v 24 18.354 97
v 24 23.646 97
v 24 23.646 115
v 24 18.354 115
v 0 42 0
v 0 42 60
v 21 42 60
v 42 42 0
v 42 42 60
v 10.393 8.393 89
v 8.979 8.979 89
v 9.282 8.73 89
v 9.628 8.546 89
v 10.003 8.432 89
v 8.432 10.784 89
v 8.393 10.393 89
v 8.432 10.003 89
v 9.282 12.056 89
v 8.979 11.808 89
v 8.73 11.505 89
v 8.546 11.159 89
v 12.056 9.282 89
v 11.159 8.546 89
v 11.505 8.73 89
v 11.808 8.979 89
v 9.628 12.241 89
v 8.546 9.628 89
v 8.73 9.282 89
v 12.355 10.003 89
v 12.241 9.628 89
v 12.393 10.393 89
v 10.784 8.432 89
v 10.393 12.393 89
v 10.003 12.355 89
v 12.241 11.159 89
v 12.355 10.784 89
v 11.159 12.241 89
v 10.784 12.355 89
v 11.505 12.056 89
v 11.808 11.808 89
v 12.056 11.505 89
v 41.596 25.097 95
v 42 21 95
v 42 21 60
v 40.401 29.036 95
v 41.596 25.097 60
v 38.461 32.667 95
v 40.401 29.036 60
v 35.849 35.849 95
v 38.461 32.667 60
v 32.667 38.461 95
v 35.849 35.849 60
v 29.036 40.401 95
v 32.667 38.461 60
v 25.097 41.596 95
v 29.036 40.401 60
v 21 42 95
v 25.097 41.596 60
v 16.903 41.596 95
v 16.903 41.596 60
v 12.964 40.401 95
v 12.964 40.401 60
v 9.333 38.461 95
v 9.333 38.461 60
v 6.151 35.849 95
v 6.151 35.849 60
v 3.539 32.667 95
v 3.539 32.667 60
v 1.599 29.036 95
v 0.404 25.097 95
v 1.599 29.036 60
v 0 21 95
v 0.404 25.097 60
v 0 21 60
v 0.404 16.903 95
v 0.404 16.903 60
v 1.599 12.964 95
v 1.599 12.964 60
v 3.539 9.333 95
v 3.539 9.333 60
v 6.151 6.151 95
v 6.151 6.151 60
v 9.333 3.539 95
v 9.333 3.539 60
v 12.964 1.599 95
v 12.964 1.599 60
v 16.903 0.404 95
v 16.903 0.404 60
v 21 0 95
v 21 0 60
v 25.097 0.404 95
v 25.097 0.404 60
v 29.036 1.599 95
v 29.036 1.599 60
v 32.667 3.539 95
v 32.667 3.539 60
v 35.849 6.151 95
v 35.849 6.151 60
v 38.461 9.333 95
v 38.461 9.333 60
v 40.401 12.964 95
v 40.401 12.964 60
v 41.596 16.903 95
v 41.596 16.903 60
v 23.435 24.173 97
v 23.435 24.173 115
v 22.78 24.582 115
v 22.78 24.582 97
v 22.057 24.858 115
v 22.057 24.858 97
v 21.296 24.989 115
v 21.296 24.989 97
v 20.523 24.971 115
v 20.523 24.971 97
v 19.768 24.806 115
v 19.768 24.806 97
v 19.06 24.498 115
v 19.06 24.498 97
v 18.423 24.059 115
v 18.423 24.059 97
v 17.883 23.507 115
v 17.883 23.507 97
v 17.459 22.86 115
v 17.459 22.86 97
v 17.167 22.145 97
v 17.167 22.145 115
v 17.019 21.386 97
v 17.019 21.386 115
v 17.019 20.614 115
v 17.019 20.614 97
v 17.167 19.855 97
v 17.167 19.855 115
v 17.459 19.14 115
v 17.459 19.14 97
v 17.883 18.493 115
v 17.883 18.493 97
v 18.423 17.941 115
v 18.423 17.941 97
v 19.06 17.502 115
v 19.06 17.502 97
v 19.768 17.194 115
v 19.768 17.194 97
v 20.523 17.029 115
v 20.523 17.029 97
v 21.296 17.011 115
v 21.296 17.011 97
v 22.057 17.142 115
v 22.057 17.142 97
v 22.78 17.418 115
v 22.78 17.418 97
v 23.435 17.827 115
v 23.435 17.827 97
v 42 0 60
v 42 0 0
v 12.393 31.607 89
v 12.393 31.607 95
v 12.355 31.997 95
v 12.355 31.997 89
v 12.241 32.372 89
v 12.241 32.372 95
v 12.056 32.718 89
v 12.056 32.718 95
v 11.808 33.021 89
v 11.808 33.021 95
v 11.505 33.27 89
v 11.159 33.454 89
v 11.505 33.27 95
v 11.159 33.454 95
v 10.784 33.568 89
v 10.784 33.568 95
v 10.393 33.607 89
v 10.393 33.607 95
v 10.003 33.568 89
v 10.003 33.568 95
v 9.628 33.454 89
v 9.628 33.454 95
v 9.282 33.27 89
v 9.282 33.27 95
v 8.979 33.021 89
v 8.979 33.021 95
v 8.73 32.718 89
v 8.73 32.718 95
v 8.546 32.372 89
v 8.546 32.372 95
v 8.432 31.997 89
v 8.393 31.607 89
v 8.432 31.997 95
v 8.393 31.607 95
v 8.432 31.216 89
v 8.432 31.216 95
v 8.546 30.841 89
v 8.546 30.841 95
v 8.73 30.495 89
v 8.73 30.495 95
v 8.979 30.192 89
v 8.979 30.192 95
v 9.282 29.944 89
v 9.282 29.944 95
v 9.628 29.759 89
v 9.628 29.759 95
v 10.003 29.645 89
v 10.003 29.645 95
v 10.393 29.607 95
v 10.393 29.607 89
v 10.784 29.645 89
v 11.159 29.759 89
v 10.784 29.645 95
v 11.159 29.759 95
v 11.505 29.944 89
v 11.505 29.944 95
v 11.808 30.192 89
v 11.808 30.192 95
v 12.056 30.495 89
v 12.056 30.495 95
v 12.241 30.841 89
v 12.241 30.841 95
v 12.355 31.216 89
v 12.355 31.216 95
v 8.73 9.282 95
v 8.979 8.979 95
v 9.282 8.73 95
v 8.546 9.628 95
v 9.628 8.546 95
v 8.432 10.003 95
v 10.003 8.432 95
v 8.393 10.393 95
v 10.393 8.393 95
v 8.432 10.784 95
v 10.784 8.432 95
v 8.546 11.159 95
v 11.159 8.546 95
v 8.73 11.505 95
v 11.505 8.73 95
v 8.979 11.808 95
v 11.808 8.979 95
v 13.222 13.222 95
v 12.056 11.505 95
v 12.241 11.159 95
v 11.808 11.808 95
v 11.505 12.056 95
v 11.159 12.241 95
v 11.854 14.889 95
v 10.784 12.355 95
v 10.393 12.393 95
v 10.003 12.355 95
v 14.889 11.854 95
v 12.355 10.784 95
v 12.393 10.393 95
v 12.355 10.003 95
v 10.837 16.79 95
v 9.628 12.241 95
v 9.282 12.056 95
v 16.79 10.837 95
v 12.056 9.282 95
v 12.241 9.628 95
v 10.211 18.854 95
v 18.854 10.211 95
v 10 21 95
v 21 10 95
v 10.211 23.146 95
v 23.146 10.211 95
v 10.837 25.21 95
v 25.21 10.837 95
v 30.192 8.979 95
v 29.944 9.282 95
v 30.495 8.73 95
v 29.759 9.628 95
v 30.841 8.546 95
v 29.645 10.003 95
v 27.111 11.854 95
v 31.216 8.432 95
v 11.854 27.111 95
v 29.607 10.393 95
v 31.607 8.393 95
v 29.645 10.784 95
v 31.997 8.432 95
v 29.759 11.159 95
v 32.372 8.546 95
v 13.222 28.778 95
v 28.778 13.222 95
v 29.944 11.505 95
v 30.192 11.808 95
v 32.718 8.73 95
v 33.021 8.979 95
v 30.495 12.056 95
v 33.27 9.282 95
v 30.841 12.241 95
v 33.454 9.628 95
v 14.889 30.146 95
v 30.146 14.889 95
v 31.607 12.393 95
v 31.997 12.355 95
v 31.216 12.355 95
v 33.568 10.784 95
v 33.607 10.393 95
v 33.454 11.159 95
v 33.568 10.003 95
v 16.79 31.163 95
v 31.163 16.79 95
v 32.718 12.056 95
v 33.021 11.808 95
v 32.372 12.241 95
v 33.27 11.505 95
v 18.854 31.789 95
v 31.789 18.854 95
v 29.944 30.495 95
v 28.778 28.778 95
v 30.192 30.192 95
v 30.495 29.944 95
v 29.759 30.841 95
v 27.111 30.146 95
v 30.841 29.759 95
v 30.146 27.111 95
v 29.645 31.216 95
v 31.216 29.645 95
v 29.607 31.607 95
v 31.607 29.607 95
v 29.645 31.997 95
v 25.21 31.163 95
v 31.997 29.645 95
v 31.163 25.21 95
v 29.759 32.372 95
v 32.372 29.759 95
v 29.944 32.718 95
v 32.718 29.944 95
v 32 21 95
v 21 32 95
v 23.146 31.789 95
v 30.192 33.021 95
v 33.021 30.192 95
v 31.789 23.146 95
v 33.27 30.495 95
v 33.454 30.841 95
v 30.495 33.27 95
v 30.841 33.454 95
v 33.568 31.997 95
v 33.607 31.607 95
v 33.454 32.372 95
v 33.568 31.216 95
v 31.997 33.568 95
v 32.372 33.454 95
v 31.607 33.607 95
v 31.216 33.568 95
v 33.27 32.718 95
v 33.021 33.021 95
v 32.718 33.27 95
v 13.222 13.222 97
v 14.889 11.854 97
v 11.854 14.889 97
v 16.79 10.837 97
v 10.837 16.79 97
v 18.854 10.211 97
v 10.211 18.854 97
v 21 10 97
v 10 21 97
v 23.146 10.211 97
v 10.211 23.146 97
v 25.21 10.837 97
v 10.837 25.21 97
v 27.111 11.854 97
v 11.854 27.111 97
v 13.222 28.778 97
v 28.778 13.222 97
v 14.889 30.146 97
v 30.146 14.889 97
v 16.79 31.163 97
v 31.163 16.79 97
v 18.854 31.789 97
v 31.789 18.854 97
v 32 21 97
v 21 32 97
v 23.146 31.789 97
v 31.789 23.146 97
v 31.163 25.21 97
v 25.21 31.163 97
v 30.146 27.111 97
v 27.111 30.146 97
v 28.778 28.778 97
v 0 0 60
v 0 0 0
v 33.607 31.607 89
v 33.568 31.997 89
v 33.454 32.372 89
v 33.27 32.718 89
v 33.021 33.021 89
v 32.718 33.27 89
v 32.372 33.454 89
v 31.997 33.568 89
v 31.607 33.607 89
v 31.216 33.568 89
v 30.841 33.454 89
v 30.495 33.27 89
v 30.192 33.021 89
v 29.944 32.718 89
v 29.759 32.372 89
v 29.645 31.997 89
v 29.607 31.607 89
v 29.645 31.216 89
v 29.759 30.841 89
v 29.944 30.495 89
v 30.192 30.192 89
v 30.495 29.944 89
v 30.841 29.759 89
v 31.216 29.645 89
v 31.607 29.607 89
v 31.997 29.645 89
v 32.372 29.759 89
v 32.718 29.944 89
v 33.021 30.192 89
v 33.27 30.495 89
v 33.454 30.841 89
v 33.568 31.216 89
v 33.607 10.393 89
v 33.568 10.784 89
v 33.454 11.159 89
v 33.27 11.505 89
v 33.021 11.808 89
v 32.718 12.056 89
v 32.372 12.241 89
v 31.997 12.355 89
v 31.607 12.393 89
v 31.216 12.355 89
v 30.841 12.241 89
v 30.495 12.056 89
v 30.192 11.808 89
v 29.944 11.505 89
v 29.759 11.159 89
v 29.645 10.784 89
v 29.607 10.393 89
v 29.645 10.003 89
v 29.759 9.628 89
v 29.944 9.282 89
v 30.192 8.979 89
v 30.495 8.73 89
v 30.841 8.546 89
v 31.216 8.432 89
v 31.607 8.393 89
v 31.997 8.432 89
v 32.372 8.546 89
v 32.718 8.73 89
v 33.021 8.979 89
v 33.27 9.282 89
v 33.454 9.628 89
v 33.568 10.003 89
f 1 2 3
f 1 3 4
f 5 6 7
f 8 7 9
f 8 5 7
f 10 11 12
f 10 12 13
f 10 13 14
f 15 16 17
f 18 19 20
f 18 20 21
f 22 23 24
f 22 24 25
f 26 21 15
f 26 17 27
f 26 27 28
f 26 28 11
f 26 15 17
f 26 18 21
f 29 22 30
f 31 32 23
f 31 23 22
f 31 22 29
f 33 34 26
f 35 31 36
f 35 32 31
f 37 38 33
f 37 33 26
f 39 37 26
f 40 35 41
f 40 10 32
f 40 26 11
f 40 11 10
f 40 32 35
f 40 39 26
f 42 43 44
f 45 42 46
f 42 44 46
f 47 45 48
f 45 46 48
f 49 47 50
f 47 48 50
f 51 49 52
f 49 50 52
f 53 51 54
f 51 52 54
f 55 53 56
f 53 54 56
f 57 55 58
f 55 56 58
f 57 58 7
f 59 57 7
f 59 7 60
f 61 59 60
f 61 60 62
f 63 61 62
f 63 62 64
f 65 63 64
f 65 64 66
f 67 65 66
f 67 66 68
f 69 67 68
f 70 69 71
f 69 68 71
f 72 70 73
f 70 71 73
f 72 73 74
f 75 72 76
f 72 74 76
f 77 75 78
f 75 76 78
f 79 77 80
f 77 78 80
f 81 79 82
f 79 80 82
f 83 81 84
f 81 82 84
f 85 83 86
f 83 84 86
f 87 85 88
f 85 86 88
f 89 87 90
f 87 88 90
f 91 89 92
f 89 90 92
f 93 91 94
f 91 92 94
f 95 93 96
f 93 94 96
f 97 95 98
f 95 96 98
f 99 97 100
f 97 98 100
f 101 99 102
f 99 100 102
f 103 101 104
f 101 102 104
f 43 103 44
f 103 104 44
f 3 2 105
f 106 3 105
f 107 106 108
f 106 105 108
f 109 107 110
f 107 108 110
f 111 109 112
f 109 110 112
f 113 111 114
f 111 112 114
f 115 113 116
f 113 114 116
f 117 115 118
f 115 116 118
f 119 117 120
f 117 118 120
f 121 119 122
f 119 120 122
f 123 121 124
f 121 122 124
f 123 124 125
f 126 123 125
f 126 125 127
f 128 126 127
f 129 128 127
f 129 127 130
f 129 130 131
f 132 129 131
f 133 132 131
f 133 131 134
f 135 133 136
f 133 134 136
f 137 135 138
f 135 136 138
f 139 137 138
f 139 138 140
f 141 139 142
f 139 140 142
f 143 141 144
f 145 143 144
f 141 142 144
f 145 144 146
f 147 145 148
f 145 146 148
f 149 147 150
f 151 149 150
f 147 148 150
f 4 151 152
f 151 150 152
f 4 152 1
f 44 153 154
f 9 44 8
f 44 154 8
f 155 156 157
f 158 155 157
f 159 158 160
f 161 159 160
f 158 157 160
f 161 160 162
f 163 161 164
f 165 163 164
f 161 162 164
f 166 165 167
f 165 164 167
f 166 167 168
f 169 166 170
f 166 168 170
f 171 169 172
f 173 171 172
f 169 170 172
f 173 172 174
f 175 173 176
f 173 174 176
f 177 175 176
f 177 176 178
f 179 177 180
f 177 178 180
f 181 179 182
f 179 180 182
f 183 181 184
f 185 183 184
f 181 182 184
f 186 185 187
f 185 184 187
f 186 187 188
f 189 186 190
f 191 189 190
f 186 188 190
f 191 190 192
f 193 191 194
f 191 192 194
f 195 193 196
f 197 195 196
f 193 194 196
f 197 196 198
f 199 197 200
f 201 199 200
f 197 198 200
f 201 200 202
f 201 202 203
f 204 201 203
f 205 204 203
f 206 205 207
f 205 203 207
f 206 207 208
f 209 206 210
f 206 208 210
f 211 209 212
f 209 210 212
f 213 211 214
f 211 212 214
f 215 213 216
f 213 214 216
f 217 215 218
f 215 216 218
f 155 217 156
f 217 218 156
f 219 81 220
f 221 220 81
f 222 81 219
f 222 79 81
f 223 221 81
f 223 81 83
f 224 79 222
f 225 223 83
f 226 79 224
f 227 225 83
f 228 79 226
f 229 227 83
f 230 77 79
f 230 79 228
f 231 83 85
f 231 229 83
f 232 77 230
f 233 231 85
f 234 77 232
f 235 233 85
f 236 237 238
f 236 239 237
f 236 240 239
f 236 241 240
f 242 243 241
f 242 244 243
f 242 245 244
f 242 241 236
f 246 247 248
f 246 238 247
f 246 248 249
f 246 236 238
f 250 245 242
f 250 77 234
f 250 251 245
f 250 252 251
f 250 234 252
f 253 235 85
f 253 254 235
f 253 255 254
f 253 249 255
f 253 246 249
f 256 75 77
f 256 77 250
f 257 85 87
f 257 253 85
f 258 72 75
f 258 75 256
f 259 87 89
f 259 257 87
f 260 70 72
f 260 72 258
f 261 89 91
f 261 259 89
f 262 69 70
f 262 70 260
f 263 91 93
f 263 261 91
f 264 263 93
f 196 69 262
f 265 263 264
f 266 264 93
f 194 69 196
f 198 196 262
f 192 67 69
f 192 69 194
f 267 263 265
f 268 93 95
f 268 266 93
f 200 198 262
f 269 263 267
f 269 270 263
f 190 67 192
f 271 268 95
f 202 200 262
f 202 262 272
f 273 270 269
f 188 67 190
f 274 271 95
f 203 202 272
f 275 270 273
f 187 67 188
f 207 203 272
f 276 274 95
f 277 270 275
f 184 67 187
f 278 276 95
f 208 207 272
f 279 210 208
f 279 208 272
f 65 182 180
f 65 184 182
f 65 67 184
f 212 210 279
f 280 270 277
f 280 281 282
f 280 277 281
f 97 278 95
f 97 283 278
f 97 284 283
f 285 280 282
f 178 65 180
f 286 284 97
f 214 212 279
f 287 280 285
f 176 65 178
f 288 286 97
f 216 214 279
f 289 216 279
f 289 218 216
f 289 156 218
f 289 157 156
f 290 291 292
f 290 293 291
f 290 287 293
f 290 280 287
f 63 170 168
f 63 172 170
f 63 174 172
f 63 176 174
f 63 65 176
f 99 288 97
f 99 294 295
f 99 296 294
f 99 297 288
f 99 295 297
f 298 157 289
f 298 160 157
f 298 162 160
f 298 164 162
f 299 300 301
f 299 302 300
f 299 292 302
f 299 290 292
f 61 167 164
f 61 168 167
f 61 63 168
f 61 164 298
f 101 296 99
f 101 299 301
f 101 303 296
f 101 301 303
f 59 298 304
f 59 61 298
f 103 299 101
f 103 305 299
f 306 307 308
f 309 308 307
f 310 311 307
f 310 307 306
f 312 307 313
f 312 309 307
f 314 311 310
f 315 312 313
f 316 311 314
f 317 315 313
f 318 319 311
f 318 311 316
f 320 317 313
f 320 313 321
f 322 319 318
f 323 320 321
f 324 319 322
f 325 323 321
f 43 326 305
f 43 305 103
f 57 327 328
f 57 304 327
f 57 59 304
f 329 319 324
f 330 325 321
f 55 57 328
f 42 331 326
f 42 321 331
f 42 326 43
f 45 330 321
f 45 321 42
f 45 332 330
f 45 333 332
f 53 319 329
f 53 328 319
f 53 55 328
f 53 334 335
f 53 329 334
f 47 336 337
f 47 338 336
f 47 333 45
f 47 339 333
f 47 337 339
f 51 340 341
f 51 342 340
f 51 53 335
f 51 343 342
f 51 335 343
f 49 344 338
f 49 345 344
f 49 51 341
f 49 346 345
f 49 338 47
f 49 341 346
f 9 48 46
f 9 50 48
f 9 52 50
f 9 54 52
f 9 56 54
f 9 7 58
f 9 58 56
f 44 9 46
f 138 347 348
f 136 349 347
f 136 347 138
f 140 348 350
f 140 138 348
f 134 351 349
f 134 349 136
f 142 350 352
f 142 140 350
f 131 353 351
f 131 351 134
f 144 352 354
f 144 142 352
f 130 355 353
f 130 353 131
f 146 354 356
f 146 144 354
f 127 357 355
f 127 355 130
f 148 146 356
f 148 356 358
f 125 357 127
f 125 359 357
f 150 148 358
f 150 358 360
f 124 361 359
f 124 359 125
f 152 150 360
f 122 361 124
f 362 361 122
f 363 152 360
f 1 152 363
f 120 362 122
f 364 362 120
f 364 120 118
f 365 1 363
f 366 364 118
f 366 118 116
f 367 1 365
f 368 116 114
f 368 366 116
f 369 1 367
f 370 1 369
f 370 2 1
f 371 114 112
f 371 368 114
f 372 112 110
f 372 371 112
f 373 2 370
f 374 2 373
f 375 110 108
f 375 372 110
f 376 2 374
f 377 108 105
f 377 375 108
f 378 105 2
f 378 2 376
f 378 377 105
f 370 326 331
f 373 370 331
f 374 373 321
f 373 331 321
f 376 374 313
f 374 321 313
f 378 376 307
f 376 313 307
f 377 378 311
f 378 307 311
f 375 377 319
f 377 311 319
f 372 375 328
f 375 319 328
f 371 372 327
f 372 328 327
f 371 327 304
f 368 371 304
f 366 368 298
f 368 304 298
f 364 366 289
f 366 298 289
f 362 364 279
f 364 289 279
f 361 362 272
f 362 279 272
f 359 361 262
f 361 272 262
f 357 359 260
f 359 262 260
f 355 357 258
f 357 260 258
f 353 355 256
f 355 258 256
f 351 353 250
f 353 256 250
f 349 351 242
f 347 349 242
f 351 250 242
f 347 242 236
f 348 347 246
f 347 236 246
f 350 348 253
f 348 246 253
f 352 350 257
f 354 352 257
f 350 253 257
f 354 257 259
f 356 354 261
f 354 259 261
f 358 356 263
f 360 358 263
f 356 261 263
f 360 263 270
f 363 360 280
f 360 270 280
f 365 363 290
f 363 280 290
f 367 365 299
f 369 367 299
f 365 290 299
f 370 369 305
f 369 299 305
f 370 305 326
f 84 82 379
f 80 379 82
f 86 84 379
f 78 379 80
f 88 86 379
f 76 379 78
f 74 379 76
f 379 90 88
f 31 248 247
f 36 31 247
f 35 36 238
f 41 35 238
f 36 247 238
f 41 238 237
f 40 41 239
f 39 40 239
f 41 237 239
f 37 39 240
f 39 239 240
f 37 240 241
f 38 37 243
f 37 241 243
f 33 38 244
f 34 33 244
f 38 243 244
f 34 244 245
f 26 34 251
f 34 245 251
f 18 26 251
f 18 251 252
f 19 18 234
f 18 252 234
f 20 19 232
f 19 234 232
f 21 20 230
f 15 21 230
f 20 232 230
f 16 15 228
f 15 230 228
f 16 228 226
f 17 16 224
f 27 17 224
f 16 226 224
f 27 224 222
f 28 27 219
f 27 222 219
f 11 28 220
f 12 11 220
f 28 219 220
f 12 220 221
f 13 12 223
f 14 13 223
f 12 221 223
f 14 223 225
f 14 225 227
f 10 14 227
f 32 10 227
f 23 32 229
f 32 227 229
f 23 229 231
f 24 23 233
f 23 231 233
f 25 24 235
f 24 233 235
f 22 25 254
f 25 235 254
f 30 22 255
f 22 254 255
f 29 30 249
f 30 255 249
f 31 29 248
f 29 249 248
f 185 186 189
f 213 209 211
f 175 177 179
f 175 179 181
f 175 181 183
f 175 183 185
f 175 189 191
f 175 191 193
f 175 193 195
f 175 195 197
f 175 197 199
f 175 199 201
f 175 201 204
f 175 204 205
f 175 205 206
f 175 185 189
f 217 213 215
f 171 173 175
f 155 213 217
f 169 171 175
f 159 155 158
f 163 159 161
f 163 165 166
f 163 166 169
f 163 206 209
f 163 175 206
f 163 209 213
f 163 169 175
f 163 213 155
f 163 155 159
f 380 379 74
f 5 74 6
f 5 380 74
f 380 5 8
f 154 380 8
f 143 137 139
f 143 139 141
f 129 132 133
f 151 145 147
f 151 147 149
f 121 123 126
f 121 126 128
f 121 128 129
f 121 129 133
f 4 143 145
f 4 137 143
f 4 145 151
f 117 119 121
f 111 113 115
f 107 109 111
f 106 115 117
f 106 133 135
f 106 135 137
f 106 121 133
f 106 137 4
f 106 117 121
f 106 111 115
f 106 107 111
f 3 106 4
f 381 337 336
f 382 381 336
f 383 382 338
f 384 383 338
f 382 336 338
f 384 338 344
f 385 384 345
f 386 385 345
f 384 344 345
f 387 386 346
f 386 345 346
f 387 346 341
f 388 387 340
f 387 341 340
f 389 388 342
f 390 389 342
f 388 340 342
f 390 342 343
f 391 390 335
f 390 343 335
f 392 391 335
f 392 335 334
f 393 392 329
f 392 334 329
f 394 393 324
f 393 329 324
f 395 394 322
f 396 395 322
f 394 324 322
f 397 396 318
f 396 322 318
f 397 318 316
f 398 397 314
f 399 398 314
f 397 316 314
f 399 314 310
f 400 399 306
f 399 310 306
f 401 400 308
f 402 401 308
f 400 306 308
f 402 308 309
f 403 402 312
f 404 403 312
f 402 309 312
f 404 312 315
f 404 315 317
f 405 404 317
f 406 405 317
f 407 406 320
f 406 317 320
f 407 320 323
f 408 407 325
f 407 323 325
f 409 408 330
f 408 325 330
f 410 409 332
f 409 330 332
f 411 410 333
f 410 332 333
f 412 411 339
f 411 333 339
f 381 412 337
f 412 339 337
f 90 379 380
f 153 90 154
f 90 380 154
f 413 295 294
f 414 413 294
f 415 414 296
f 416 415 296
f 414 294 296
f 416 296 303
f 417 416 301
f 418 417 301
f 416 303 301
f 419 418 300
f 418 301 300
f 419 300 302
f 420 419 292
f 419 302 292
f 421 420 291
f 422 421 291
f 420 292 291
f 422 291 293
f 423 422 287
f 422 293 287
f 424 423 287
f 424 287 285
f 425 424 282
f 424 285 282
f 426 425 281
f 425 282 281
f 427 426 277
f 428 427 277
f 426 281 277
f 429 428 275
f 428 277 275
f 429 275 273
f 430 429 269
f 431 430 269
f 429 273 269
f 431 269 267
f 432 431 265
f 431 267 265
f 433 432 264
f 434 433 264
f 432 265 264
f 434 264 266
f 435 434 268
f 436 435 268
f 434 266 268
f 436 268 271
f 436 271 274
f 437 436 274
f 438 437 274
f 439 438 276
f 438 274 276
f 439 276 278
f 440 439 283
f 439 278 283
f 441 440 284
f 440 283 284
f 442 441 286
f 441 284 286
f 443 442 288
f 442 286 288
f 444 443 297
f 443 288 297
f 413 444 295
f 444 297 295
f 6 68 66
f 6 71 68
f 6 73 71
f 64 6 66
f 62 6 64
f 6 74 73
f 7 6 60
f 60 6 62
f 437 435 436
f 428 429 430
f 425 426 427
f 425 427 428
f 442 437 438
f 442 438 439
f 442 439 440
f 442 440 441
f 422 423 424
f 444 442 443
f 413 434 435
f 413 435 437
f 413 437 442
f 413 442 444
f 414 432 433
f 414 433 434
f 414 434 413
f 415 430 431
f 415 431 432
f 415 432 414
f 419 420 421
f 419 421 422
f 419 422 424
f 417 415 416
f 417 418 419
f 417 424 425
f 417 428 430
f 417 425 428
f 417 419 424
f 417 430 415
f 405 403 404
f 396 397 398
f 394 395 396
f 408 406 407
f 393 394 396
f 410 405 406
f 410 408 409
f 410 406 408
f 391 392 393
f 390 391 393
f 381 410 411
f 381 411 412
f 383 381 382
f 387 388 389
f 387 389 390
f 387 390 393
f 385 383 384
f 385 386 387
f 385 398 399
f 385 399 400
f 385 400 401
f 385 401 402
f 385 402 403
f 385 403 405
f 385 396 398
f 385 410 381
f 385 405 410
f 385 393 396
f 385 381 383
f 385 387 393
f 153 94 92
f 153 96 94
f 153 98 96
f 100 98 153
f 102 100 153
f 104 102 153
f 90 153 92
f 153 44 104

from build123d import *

# Parameters (mm, degrees)
SKETCH_W     = 42
SKETCH_H     = 42
PAD_DEPTH    = 60
SKETCH001_R  = 21
PAD001_DEPTH = 35
SKETCH002_R  = 11
PAD002_DEPTH = 2
PAD003_DEPTH = 18
SKETCH004_R  = 2
POCKET_DEPTH = 6


with BuildPart() as part:
    # Sketch → Pad (new body)
    with BuildSketch(Plane.XY):
        with Locations((21, 21)):
            Rectangle(SKETCH_W, SKETCH_H)
    extrude(amount=PAD_DEPTH)

    # Sketch001 (on Face6 of Pad) → Pad001 (join)
    with BuildSketch(Plane.XY.offset(60)):
        with Locations((21, 21)):
            Circle(SKETCH001_R)
    extrude(amount=PAD001_DEPTH)

    # Sketch002 (on Face11 of Pad001) → Pad002 (join)
    with BuildSketch(Plane.XY.offset(95)):
        with Locations((21, 21)):
            Circle(SKETCH002_R)
    extrude(amount=PAD002_DEPTH)

    # Sketch003 (on Face13 of Pad002) → Pad003 (join)
    with BuildSketch(Plane.XY.offset(97)):
        with BuildLine():
            ThreePointArc((24, 23.645751), (17, 21), (24, 18.354249))
            Line((24, 23.645751), (24, 18.354249))
        make_face()
    extrude(amount=PAD003_DEPTH)

    # Sketch004 (on Face11 of Pad003) → Pocket (cut)
    with BuildSketch(Plane.XY.offset(95)):
        with Locations((10.393398, 10.393398)):
            Circle(SKETCH004_R)
        with Locations((31.606602, 10.393398)):
            Circle(SKETCH004_R)
        with Locations((31.606602, 31.606602)):
            Circle(SKETCH004_R)
        with Locations((10.393398, 31.606602)):
            Circle(SKETCH004_R)
    extrude(amount=-POCKET_DEPTH, mode=Mode.SUBTRACT)


solid = part.part
